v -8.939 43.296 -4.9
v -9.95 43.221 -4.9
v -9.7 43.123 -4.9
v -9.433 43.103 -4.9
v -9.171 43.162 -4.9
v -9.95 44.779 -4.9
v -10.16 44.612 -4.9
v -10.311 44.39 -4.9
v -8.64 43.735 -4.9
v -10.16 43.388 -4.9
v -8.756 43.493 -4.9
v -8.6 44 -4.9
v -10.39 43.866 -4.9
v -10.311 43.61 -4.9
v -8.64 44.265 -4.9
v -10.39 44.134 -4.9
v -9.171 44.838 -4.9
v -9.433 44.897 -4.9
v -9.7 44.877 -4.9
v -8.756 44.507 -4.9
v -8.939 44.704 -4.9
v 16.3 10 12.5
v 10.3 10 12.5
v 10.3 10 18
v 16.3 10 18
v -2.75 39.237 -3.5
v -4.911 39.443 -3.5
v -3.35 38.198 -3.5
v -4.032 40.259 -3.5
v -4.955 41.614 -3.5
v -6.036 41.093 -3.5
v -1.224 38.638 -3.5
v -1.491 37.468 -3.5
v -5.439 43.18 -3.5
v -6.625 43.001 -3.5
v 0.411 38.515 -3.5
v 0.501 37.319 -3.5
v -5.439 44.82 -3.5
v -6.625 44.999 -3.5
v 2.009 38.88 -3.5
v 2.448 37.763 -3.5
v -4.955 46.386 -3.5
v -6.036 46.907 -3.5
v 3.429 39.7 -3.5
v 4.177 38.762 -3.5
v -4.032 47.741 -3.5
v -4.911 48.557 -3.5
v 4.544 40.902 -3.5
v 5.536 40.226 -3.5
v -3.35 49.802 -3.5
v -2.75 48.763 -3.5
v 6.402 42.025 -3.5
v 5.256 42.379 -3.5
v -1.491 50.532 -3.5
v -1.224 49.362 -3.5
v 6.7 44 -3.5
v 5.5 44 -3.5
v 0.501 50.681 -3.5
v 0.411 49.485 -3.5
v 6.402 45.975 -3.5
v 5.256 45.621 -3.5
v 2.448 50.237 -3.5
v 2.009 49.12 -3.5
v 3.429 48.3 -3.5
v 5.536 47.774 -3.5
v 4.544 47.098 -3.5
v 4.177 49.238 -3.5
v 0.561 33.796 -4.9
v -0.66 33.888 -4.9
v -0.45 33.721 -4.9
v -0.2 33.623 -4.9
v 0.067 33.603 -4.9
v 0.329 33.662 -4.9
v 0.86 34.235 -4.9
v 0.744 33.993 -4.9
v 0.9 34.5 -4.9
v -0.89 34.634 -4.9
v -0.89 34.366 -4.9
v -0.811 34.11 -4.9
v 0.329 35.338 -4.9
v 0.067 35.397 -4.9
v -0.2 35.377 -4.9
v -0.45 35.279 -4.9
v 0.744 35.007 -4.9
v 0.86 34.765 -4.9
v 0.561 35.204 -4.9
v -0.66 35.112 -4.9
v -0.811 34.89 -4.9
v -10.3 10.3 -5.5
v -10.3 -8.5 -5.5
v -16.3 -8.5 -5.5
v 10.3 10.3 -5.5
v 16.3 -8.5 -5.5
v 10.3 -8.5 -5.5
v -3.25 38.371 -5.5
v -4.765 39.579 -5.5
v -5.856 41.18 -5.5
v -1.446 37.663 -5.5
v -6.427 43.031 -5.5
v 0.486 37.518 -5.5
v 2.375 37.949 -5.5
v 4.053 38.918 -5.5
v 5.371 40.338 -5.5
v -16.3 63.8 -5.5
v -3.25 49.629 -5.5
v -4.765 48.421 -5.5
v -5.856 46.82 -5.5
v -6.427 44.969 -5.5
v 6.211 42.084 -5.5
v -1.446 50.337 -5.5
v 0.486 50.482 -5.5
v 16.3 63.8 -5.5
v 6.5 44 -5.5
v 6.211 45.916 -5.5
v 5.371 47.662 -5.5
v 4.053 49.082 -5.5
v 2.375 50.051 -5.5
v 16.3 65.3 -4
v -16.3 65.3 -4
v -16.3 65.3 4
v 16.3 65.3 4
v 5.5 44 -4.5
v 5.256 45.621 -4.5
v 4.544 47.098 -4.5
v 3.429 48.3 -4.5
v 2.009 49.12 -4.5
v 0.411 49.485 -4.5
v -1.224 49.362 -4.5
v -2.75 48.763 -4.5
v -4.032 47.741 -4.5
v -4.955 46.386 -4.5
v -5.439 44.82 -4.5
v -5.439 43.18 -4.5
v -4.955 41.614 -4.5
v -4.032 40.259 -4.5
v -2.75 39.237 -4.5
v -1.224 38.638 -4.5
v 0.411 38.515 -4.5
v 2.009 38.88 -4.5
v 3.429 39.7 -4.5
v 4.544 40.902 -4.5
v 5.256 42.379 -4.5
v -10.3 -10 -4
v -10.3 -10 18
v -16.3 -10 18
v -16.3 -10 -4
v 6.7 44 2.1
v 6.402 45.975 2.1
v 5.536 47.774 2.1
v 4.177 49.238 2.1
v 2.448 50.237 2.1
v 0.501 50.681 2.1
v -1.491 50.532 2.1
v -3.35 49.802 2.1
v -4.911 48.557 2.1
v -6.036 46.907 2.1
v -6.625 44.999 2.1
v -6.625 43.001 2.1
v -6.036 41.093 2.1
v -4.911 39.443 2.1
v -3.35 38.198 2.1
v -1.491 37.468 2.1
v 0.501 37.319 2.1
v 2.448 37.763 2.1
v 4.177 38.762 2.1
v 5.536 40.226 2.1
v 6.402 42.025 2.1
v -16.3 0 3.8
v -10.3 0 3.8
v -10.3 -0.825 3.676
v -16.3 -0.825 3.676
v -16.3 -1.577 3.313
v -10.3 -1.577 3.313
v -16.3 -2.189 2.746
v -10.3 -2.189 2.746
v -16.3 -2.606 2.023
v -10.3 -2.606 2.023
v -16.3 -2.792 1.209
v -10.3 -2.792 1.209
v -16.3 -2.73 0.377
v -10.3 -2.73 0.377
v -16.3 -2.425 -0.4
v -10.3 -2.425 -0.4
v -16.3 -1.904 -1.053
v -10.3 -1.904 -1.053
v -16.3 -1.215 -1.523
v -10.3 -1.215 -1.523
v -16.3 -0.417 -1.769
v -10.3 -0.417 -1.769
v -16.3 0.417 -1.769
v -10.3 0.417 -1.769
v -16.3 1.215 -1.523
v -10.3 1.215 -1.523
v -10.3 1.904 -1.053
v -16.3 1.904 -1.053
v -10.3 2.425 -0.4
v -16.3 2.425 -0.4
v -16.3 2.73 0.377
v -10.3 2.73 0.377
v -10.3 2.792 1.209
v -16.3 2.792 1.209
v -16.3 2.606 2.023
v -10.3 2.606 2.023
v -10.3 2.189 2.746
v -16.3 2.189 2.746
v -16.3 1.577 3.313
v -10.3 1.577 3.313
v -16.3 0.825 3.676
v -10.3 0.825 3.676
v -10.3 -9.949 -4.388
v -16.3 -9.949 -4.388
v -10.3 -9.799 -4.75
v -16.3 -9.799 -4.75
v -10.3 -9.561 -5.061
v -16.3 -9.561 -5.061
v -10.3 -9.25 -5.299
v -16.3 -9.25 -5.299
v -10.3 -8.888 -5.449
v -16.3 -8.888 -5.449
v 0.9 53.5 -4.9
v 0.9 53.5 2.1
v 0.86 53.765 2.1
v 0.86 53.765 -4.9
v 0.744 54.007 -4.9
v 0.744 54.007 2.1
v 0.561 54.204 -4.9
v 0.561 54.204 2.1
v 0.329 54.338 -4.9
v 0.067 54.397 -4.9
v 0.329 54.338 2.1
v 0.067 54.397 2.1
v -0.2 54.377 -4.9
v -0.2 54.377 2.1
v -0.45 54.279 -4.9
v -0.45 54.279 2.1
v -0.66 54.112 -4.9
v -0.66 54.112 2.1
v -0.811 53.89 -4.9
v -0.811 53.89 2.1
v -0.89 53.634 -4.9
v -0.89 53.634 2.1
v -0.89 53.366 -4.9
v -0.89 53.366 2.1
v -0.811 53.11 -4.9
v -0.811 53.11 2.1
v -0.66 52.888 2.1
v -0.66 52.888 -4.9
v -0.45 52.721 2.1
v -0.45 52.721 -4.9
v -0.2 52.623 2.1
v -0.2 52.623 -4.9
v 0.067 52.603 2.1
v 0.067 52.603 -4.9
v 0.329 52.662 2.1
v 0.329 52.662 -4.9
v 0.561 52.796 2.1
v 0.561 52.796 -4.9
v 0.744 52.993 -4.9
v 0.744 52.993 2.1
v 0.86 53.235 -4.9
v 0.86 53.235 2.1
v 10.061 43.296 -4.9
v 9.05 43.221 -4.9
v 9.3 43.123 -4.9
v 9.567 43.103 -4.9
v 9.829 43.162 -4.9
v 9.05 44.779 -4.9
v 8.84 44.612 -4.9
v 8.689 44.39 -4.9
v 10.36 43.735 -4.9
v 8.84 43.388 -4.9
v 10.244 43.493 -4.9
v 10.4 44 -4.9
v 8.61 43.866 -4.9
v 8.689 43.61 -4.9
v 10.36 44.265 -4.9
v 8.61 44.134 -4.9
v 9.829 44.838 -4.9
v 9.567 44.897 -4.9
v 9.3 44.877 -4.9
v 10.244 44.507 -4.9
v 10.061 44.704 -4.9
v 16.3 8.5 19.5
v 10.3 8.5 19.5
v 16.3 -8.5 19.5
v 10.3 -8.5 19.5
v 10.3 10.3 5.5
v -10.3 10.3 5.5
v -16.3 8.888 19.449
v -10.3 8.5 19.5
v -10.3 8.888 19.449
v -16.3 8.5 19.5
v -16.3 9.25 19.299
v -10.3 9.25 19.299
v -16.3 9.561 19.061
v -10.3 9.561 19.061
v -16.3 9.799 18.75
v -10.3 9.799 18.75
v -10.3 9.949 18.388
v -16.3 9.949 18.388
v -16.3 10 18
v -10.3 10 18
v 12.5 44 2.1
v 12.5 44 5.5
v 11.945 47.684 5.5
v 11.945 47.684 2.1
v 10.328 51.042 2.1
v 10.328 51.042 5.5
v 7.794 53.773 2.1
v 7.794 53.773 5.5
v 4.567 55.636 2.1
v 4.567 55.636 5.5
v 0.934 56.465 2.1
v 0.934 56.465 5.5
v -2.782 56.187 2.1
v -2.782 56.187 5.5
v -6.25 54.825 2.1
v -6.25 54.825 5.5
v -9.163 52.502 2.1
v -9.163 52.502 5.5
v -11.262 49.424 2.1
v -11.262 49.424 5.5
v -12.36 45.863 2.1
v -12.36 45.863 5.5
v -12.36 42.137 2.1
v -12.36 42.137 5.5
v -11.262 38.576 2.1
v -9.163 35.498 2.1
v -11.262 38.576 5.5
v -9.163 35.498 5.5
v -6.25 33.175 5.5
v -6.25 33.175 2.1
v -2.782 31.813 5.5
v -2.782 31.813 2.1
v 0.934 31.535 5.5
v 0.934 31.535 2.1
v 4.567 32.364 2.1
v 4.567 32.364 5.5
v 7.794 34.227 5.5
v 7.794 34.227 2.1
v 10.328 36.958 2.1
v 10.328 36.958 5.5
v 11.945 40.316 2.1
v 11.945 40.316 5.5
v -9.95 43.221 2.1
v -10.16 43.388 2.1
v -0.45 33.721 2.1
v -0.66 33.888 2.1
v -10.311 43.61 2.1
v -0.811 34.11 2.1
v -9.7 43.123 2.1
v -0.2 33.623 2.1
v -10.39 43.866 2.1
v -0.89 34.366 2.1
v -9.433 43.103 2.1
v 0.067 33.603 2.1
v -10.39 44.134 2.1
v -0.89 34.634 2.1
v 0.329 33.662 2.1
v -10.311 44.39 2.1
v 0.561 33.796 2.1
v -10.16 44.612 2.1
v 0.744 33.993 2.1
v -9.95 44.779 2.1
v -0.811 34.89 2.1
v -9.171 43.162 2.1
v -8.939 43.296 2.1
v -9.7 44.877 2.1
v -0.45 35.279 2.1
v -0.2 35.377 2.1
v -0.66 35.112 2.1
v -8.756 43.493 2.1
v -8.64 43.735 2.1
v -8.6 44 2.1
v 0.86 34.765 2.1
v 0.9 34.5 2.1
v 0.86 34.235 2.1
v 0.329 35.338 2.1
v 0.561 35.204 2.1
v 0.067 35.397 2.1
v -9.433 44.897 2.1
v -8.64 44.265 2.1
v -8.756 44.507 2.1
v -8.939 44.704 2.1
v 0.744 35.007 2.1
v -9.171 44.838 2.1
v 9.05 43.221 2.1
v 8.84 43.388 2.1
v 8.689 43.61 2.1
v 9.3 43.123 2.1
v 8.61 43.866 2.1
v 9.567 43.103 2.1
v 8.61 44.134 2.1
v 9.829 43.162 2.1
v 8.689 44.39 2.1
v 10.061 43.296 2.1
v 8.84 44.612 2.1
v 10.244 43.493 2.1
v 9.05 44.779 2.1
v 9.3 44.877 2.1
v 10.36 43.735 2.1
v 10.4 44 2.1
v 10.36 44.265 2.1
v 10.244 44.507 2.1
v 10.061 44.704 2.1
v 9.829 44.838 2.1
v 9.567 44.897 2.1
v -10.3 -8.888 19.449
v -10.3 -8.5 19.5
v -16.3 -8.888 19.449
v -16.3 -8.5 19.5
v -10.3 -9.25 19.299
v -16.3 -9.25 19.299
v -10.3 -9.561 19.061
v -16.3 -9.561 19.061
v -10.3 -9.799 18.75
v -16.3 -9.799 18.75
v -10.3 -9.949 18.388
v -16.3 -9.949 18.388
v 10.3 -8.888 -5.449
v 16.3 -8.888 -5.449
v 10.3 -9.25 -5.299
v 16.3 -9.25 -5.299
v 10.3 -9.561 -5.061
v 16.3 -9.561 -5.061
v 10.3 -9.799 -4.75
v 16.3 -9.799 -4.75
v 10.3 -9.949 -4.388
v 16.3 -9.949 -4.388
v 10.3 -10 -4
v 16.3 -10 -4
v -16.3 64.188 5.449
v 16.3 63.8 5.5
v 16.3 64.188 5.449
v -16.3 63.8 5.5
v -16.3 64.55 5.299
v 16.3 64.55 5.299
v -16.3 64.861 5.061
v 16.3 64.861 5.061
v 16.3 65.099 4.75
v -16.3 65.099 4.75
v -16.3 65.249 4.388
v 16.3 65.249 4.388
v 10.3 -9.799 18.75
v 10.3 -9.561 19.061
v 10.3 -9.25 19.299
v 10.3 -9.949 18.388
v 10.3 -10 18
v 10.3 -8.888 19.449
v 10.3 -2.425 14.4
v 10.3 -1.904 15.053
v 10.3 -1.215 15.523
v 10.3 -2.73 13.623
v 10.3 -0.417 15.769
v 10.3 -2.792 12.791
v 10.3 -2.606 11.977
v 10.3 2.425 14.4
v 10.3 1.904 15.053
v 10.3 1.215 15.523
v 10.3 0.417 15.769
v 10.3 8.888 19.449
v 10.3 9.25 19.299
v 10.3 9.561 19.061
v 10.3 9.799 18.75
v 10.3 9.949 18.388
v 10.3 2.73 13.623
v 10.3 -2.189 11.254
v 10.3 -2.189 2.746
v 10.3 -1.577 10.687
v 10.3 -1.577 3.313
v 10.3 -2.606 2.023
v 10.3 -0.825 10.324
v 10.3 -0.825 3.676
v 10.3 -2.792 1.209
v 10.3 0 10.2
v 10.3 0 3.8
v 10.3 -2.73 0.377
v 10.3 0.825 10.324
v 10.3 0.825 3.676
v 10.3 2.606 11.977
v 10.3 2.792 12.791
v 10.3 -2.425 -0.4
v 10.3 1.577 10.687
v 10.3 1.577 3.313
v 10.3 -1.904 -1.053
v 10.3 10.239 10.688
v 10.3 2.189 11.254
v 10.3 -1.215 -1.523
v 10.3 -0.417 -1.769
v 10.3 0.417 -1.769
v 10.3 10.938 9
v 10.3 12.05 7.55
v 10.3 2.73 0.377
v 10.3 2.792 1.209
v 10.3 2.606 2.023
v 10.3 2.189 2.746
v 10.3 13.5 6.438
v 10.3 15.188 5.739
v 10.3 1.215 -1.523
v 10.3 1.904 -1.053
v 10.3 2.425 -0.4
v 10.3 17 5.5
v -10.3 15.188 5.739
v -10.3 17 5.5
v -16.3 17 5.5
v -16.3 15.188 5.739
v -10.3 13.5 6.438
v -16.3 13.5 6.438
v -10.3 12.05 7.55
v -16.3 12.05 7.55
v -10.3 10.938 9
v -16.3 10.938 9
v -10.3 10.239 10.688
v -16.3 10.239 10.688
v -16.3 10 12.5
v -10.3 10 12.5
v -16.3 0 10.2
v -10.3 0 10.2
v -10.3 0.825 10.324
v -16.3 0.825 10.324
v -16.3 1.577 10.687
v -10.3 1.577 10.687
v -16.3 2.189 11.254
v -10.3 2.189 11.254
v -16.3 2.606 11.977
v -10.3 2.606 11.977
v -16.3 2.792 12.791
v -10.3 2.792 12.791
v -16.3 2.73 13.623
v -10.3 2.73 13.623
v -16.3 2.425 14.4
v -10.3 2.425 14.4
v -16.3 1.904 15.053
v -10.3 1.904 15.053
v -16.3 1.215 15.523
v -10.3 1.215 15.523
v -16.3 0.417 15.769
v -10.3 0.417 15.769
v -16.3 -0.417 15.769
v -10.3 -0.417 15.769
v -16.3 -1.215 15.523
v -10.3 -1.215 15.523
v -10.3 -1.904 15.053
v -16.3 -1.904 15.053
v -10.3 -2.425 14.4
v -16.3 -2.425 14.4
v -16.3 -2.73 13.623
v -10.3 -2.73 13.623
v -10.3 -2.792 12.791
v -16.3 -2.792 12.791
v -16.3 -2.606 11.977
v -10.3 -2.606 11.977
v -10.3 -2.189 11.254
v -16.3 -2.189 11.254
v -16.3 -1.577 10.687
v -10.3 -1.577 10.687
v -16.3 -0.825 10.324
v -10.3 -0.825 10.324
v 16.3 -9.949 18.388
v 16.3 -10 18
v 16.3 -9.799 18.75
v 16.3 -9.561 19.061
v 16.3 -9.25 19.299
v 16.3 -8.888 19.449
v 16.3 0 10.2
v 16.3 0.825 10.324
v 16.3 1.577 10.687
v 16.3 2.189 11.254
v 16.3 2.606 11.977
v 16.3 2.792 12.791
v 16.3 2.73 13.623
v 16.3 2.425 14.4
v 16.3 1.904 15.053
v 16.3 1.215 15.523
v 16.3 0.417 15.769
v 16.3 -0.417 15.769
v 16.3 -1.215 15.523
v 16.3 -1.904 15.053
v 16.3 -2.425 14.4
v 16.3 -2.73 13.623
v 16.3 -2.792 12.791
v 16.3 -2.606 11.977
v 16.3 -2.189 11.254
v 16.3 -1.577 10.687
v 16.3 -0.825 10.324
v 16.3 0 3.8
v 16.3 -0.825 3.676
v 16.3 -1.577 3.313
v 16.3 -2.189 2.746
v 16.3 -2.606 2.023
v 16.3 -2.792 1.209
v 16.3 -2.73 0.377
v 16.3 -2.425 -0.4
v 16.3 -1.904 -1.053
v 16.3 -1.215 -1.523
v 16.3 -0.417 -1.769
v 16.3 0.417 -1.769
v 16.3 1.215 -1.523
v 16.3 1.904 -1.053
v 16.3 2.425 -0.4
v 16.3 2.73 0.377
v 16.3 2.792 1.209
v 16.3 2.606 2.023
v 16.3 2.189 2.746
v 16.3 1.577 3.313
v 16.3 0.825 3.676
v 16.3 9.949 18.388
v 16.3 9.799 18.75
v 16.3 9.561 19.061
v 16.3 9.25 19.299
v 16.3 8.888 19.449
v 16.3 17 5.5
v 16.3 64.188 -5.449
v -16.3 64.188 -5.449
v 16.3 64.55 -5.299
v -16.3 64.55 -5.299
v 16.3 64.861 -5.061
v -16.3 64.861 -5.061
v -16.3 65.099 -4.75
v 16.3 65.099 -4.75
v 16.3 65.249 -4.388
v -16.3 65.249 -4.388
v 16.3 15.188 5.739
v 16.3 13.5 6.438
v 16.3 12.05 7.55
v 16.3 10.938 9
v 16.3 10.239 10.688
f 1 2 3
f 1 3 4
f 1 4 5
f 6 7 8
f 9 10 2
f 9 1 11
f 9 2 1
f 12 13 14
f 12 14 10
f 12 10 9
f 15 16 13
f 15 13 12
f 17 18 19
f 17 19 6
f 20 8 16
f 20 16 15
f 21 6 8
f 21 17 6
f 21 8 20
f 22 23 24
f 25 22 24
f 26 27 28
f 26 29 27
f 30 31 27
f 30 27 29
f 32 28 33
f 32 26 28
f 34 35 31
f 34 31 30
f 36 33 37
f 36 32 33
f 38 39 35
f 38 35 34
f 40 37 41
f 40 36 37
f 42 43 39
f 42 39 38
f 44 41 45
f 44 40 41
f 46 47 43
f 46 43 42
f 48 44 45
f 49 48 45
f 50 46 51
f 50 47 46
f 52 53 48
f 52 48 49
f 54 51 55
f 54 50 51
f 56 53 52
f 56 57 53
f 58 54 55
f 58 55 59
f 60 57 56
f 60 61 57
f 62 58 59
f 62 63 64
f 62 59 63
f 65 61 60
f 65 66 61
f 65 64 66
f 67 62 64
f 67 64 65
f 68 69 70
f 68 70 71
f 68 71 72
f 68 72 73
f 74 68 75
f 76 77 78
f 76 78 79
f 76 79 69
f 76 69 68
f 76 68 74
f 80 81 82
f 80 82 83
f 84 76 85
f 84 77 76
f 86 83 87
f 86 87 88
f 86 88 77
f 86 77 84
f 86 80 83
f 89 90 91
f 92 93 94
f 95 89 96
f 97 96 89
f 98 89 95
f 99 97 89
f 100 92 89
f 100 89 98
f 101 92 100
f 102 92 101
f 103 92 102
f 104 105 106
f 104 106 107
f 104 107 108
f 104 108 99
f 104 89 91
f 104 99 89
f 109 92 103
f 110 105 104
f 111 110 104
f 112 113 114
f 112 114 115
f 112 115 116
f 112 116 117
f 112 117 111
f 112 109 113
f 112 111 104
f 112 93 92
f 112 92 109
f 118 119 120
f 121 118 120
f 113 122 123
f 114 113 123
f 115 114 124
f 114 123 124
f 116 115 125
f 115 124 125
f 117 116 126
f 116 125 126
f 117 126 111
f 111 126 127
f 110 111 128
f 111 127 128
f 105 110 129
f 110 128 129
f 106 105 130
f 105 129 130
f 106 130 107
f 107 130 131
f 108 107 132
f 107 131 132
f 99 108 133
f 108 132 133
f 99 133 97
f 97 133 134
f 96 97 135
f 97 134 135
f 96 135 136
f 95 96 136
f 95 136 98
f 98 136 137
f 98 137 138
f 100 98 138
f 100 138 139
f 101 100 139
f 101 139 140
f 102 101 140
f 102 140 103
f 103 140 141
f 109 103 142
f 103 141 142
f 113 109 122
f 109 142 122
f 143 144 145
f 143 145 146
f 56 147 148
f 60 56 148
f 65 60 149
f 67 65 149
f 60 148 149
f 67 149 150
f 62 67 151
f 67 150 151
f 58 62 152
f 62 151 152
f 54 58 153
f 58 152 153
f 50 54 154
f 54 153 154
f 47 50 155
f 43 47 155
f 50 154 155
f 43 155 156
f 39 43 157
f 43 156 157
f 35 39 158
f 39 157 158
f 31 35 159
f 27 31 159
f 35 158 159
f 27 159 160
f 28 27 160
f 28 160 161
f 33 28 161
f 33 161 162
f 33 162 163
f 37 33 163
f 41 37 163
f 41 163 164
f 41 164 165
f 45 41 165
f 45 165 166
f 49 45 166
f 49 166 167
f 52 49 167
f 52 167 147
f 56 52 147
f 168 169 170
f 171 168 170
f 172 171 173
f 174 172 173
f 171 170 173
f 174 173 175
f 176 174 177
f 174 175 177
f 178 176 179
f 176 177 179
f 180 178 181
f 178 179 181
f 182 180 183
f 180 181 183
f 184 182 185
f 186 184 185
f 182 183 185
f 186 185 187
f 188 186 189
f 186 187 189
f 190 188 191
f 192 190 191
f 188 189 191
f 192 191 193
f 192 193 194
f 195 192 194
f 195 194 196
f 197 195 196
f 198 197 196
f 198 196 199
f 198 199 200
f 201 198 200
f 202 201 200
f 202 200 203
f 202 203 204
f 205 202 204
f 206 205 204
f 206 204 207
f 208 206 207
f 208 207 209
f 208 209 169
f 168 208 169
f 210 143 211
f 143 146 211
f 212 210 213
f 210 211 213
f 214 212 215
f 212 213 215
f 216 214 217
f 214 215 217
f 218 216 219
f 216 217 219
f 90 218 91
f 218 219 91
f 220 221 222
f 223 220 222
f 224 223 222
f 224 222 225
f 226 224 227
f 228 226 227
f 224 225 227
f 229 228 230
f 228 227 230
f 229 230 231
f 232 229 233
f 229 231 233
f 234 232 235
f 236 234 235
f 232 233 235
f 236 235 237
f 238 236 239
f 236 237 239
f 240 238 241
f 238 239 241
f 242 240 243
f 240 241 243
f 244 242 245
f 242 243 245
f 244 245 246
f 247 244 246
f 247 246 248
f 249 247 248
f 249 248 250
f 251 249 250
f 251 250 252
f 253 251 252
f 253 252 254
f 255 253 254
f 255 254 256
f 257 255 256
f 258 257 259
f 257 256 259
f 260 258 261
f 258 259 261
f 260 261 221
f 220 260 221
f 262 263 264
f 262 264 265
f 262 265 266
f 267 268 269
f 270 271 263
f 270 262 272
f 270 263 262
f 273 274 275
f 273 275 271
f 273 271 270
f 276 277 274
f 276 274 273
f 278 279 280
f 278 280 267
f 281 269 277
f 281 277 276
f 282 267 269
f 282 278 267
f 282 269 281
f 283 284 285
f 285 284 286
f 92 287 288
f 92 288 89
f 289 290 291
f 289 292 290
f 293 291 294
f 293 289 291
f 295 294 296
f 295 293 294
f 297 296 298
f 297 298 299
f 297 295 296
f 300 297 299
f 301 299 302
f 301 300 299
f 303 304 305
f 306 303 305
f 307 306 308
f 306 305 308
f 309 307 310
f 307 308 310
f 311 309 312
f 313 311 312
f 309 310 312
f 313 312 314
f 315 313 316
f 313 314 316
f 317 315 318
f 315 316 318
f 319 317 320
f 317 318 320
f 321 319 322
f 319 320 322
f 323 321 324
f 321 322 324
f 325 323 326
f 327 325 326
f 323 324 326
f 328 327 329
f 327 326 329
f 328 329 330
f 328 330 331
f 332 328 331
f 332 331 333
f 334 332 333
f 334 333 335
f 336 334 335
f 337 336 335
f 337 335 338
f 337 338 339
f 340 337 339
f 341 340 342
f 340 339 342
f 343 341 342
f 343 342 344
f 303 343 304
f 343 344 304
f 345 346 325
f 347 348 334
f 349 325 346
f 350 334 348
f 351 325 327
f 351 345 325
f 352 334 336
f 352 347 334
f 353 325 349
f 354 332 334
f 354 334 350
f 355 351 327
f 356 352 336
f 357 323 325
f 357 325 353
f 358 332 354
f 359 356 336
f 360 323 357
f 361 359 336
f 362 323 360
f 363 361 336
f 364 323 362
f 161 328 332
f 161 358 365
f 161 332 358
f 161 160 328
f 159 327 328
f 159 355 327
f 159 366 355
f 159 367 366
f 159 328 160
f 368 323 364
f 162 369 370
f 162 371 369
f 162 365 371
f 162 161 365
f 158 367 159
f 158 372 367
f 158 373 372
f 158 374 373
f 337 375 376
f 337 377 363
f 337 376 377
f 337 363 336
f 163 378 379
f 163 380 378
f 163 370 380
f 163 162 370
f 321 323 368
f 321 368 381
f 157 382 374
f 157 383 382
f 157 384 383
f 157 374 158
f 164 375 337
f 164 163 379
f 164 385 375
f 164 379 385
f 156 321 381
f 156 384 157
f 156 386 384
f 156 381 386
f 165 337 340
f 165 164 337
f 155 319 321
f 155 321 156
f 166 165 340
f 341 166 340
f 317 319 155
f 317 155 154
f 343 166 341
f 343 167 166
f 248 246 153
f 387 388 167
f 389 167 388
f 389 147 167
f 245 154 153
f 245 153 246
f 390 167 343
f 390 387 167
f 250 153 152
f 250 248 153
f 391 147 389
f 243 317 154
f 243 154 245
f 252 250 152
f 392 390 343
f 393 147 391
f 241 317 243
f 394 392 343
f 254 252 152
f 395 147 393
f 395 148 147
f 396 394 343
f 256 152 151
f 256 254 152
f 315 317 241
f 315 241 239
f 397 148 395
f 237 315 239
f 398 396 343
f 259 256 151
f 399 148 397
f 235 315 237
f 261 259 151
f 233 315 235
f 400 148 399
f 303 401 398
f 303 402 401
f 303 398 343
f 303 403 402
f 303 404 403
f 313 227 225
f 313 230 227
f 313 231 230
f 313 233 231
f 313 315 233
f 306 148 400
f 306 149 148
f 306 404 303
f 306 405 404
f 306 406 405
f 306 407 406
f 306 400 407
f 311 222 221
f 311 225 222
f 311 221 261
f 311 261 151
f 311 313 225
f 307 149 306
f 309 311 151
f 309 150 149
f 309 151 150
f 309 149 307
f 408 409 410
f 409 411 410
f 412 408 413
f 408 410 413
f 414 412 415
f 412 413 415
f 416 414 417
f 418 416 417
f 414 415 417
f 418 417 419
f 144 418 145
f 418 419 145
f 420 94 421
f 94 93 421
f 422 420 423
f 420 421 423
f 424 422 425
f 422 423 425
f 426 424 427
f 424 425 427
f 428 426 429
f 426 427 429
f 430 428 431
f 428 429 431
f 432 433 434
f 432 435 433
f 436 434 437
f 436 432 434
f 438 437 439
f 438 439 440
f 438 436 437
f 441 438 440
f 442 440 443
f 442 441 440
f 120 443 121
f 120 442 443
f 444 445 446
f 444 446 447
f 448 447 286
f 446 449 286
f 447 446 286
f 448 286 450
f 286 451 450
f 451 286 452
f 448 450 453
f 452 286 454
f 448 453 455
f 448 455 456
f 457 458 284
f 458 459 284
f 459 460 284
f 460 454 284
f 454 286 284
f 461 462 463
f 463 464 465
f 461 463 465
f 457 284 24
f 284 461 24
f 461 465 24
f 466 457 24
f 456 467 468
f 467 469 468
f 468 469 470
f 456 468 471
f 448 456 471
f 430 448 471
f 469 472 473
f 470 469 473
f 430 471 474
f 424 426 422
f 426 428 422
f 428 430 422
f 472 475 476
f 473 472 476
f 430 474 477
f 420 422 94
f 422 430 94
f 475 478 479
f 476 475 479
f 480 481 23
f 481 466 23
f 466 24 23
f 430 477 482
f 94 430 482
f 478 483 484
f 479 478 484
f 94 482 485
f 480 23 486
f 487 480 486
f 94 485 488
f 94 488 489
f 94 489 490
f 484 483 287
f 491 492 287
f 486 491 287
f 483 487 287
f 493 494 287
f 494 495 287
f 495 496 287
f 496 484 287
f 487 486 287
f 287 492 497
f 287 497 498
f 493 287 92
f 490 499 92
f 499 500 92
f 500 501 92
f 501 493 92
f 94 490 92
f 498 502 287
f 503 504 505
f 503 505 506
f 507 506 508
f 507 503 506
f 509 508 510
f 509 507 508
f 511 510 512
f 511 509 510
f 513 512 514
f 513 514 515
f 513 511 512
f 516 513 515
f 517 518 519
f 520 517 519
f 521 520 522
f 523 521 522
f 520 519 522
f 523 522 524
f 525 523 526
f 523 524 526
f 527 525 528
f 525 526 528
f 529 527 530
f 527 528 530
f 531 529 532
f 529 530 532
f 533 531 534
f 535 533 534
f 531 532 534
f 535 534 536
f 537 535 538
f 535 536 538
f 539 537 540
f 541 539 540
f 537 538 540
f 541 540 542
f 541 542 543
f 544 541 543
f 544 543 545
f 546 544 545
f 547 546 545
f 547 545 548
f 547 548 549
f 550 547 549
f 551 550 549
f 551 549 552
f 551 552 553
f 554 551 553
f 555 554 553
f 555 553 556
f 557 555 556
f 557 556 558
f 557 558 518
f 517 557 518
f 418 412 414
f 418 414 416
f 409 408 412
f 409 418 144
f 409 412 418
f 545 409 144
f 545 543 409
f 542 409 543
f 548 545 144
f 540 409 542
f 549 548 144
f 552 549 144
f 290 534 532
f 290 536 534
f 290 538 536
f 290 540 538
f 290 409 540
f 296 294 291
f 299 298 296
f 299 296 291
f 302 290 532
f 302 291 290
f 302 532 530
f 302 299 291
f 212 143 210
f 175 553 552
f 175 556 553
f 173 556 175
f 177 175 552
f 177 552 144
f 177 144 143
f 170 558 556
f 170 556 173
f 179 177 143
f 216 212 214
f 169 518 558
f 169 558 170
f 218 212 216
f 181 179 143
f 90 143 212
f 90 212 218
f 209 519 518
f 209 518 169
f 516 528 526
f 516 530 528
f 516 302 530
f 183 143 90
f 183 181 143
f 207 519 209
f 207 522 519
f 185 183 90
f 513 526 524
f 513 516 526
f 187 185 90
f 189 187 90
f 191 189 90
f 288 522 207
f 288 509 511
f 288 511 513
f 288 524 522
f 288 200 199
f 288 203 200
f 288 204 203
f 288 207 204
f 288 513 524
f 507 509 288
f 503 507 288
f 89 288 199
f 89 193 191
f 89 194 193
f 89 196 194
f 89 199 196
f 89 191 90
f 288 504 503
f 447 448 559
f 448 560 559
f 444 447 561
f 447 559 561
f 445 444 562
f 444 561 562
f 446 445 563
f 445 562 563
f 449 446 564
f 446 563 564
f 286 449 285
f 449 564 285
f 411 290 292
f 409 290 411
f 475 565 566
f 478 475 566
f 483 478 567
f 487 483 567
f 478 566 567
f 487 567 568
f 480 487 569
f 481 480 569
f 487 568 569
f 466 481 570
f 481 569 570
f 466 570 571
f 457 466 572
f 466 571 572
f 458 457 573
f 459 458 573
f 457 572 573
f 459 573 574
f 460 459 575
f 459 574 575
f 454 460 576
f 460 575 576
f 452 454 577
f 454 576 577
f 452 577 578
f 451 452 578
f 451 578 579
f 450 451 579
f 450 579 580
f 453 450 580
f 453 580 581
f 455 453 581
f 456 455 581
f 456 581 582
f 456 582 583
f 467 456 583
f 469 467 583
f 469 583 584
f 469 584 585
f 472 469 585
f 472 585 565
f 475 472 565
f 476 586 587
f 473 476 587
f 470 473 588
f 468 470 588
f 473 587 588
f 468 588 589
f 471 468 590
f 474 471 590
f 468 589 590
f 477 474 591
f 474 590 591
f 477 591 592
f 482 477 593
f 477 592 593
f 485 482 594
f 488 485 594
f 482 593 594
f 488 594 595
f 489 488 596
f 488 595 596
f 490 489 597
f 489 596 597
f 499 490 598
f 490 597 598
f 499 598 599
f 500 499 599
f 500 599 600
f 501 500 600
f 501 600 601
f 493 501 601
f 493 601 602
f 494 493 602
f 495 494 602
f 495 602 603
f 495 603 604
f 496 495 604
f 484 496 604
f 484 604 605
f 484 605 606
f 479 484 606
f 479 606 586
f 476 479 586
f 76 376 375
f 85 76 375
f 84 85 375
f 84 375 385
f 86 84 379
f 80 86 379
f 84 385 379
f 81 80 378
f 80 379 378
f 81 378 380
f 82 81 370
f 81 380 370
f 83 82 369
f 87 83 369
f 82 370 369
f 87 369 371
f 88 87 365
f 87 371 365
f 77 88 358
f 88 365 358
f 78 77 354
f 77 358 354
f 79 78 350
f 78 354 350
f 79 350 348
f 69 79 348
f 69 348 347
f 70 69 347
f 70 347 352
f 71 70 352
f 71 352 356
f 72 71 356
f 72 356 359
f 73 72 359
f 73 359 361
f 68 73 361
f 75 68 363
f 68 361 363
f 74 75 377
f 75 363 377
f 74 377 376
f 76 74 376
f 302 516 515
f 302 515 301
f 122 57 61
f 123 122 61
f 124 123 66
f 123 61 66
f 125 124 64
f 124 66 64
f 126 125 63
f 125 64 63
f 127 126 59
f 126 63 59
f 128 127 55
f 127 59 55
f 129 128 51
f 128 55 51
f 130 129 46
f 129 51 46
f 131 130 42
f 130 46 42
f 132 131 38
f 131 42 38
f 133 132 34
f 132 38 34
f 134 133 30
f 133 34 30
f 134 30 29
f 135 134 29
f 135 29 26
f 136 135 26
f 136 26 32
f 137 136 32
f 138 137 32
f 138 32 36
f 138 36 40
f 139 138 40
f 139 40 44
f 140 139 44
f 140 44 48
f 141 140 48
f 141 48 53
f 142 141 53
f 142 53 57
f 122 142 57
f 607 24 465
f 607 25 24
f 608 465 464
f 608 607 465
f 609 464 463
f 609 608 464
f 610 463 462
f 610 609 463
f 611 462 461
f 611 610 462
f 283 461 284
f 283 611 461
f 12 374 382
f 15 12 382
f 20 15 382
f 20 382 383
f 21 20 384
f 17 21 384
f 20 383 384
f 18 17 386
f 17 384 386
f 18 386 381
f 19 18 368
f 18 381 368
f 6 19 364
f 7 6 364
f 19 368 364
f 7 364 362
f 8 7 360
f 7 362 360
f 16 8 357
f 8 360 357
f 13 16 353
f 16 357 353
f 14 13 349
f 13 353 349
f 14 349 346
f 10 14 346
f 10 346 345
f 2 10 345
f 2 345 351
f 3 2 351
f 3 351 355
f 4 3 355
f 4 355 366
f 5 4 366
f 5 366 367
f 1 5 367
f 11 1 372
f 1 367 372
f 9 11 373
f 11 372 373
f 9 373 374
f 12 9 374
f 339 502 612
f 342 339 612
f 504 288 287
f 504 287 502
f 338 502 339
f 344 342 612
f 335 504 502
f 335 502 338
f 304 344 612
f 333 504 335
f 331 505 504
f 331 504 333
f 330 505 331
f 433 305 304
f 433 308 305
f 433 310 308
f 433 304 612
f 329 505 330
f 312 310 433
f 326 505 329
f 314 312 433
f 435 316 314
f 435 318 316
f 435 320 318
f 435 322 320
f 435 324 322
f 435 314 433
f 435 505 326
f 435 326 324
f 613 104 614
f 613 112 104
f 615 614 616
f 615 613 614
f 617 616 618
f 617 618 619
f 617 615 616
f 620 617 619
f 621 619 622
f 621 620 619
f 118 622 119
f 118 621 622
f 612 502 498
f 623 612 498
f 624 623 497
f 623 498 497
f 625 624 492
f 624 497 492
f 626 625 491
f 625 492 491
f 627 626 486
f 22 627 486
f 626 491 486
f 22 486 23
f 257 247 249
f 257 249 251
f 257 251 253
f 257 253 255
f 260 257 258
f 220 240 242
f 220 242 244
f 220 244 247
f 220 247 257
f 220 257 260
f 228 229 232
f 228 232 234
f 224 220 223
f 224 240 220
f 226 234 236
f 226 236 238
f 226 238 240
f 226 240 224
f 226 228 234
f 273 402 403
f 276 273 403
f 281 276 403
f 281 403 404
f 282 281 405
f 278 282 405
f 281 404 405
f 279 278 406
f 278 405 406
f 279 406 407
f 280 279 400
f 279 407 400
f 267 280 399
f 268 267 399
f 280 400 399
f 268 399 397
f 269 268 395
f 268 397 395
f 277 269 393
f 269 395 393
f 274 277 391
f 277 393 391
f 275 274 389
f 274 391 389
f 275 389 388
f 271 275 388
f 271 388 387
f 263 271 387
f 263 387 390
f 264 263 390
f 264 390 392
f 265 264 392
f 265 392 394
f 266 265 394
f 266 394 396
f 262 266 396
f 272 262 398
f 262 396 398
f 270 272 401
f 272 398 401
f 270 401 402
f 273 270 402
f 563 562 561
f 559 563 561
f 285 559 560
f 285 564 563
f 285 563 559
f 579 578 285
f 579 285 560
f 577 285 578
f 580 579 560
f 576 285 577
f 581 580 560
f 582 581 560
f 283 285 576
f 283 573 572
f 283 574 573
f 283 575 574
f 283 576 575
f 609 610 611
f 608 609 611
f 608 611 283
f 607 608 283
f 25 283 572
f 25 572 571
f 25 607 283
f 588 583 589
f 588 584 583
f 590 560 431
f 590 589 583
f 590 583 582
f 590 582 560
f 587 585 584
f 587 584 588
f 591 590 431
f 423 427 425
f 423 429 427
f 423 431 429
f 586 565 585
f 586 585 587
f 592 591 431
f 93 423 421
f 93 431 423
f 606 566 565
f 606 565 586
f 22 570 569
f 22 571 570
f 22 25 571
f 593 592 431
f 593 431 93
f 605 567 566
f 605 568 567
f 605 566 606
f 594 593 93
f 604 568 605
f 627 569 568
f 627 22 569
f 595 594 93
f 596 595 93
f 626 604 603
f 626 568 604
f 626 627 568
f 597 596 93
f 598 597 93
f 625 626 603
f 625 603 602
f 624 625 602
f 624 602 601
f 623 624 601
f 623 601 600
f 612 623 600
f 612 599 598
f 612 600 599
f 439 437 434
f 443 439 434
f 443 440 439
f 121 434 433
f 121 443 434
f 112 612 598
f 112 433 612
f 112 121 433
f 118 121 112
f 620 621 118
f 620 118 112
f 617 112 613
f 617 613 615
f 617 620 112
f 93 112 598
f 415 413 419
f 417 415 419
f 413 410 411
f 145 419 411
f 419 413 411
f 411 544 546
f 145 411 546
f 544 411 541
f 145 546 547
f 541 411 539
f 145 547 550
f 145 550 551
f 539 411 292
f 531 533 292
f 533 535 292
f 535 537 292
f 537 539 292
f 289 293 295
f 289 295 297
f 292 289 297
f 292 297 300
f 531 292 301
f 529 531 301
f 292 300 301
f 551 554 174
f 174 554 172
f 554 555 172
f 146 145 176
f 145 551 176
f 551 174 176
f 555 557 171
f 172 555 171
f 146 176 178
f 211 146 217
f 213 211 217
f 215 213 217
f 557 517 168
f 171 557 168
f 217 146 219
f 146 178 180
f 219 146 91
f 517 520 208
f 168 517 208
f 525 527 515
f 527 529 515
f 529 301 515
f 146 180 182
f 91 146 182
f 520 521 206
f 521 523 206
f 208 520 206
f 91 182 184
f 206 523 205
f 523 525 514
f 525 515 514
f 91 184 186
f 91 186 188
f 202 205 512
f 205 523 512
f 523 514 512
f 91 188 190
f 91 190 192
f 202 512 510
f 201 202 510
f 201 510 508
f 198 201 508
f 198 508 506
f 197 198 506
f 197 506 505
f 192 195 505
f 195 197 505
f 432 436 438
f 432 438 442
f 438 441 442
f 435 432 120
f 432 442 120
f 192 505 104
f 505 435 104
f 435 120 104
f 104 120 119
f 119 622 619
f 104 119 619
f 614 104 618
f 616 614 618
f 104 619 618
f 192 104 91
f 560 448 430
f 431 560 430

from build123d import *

# Parameters (mm, degrees)
EXTRUDE1_DEPTH      = 10.3
EXTRUDE1_DEPTH_BACK = 10.3
SKETCH1_W           = 11
SKETCH1_H           = 55
EXTRUDE2_DEPTH      = 6
SKETCH5_R           = 5.5
EXTRUDE4_DEPTH      = 69.744308855
SKETCH_1_R          = 2.8
CUT_EXTRUDE_1_DEPTH = 76.545350618
FILLET2_R           = 1.5
SKETCH_4_R          = 6.7
CUT_EXTRUDE_2_DEPTH = 9
SKETCH_5_R          = 12.5
CUT_EXTRUDE_3_DEPTH = 3.4
SKETCH_6_R          = 0.9
CUT_EXTRUDE_4_DEPTH = 7
CHAMFER_1_SIZE      = 1


with BuildPart() as part:
    # Sketch1 → Extrude1 (new, two sides: drawn at the far end of the back side and taken through both)
    with BuildSketch(Plane(origin=(0, 0, 0), x_dir=(0, 0, -1), z_dir=(1, 0, 0)).offset(-EXTRUDE1_DEPTH_BACK)):
        with Locations((0, 37.8)):
            Rectangle(SKETCH1_W, SKETCH1_H)
    extrude(amount=EXTRUDE1_DEPTH + EXTRUDE1_DEPTH_BACK)

    # Sketch2 → Extrude2 (add)
    with BuildSketch(Plane(origin=(10.3, 0, 0), x_dir=(0, 0, -1), z_dir=(1, 0, 0))):
        with BuildLine():
            Line((-19.5, 10), (-19.5, -10))
            Line((-19.5, -10), (5.5, -10))
            Line((5.5, -10), (5.5, 17))
            Line((5.5, 17), (5.5, 65.3))
            Line((5.5, 65.3), (-5.5, 65.3))
            Line((-5.5, 65.3), (-5.5, 17))
            ThreePointArc((-5.5, 17), (-7.550252532, 12.050252532), (-12.5, 10))
            Line((-12.5, 10), (-19.5, 10))
        make_face()
    extrude2 = extrude(amount=EXTRUDE2_DEPTH)

    # Mirror2: Extrude2 across plane
    add(extrude2.mirror(Plane(origin=(0, 0, 0), x_dir=(0, 0, 1), z_dir=(1, 0, 0))))

    # Sketch5 → Extrude4 (cut, through all)
    with BuildSketch(Plane.XY.offset(5.5)):
        with Locations((0, 44)):
            Circle(SKETCH5_R)
    extrude(amount=-EXTRUDE4_DEPTH, mode=Mode.SUBTRACT)

    # Эскиз1 → Вырез-Вытянуть1 (cut, through all)
    with BuildSketch(Plane(origin=(16.3, 0, 0), x_dir=(0, 0, -1), z_dir=(1, 0, 0))):
        with Locations((-13, 0)):
            Circle(SKETCH_1_R)
        with Locations(Location((-1, 0, 0), (0, 0, 180))):
            Circle(SKETCH_1_R)
    extrude(amount=-CUT_EXTRUDE_1_DEPTH, mode=Mode.SUBTRACT)

    # Fillet2
    fillet2_edges = [part.edges().sort_by_distance(p)[0] for p in [
        (13.3, -10, 19.5),
        (13.3, -10, -5.5),
        (13.3, 10, 19.5),
        (-13.3, -10, -5.5),
        (-13.3, -10, 19.5),
        (-13.3, 10, 19.5),
        (0, 65.3, 5.5),
        (0, 65.3, -5.5),
    ]]
    fillet(fillet2_edges, radius=FILLET2_R)

    # Эскиз4 → Вырез-Вытянуть2 (cut)
    with BuildSketch(Plane.XY.offset(5.5)):
        with Locations((0, 44)):
            Circle(SKETCH_4_R)
    extrude(amount=-CUT_EXTRUDE_2_DEPTH, mode=Mode.SUBTRACT)

    # Эскиз5 → Вырез-Вытянуть3 (cut)
    with BuildSketch(Plane.XY.offset(5.5)):
        with Locations((0, 44)):
            Circle(SKETCH_5_R)
    extrude(amount=-CUT_EXTRUDE_3_DEPTH, mode=Mode.SUBTRACT)

    # Эскиз6 → Вырез-Вытянуть4 (cut)
    with BuildSketch(Plane.XY.offset(2.1)):
        with Locations((0, 53.5)):
            Circle(SKETCH_6_R)
        with Locations((9.5, 44)):
            Circle(SKETCH_6_R)
        with Locations((0, 34.5)):
            Circle(SKETCH_6_R)
        with Locations((-9.5, 44)):
            Circle(SKETCH_6_R)
    extrude(amount=-CUT_EXTRUDE_4_DEPTH, mode=Mode.SUBTRACT)

    # Фаска1
    chamfer_1_edges = [part.edges().sort_by_distance(p)[0] for p in [
        (-5.5, 44, -5.5),
    ]]
    chamfer(chamfer_1_edges, length=CHAMFER_1_SIZE)


solid = part.part
